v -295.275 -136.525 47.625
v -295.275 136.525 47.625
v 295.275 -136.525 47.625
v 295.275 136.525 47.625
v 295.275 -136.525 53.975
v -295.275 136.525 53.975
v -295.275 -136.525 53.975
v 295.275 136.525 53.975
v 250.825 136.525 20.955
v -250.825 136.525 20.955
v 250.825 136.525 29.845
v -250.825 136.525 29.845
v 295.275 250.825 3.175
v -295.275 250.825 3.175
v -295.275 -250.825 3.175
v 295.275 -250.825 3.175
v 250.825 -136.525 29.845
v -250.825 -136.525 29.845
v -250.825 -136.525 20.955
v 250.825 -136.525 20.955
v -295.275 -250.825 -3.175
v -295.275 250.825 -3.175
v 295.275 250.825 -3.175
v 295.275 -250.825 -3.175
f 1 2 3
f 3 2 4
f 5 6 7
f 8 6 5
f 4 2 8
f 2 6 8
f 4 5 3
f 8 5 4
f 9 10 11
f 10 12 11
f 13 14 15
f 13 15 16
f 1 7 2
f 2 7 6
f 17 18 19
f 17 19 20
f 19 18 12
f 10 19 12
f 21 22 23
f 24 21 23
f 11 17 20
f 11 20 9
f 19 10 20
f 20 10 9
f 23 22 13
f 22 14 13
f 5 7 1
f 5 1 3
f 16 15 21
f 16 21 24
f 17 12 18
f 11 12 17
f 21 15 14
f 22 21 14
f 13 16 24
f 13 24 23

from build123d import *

# Parameters (mm, degrees)
F2_W     = 590.55
F2_H     = 501.65
F3_DEPTH = 3.175
F4_W     = 501.65
F4_H     = 273.05
F5_DEPTH = 4.445
F6_W     = 590.55
F6_H     = 273.05
F7_DEPTH = 3.175


with BuildPart() as f3:
    # F2 (on Top) → F3 (new body, symmetric)
    with BuildSketch(Plane.XY):
        Rectangle(F2_W, F2_H)
    extrude(amount=F3_DEPTH, both=True)


with BuildPart() as f5:
    # F4 (on offset) → F5 (new body, symmetric)
    with BuildSketch(Plane.XY.offset(25.4)):
        Rectangle(F4_W, F4_H)
    extrude(amount=F5_DEPTH, both=True)


with BuildPart() as f7:
    # F6 (on offset) → F7 (new body, symmetric)
    with BuildSketch(Plane.XY.offset(50.8)):
        Rectangle(F6_W, F6_H)
    extrude(amount=F7_DEPTH, both=True)


solid = Compound([f3.part, f5.part, f7.part])
